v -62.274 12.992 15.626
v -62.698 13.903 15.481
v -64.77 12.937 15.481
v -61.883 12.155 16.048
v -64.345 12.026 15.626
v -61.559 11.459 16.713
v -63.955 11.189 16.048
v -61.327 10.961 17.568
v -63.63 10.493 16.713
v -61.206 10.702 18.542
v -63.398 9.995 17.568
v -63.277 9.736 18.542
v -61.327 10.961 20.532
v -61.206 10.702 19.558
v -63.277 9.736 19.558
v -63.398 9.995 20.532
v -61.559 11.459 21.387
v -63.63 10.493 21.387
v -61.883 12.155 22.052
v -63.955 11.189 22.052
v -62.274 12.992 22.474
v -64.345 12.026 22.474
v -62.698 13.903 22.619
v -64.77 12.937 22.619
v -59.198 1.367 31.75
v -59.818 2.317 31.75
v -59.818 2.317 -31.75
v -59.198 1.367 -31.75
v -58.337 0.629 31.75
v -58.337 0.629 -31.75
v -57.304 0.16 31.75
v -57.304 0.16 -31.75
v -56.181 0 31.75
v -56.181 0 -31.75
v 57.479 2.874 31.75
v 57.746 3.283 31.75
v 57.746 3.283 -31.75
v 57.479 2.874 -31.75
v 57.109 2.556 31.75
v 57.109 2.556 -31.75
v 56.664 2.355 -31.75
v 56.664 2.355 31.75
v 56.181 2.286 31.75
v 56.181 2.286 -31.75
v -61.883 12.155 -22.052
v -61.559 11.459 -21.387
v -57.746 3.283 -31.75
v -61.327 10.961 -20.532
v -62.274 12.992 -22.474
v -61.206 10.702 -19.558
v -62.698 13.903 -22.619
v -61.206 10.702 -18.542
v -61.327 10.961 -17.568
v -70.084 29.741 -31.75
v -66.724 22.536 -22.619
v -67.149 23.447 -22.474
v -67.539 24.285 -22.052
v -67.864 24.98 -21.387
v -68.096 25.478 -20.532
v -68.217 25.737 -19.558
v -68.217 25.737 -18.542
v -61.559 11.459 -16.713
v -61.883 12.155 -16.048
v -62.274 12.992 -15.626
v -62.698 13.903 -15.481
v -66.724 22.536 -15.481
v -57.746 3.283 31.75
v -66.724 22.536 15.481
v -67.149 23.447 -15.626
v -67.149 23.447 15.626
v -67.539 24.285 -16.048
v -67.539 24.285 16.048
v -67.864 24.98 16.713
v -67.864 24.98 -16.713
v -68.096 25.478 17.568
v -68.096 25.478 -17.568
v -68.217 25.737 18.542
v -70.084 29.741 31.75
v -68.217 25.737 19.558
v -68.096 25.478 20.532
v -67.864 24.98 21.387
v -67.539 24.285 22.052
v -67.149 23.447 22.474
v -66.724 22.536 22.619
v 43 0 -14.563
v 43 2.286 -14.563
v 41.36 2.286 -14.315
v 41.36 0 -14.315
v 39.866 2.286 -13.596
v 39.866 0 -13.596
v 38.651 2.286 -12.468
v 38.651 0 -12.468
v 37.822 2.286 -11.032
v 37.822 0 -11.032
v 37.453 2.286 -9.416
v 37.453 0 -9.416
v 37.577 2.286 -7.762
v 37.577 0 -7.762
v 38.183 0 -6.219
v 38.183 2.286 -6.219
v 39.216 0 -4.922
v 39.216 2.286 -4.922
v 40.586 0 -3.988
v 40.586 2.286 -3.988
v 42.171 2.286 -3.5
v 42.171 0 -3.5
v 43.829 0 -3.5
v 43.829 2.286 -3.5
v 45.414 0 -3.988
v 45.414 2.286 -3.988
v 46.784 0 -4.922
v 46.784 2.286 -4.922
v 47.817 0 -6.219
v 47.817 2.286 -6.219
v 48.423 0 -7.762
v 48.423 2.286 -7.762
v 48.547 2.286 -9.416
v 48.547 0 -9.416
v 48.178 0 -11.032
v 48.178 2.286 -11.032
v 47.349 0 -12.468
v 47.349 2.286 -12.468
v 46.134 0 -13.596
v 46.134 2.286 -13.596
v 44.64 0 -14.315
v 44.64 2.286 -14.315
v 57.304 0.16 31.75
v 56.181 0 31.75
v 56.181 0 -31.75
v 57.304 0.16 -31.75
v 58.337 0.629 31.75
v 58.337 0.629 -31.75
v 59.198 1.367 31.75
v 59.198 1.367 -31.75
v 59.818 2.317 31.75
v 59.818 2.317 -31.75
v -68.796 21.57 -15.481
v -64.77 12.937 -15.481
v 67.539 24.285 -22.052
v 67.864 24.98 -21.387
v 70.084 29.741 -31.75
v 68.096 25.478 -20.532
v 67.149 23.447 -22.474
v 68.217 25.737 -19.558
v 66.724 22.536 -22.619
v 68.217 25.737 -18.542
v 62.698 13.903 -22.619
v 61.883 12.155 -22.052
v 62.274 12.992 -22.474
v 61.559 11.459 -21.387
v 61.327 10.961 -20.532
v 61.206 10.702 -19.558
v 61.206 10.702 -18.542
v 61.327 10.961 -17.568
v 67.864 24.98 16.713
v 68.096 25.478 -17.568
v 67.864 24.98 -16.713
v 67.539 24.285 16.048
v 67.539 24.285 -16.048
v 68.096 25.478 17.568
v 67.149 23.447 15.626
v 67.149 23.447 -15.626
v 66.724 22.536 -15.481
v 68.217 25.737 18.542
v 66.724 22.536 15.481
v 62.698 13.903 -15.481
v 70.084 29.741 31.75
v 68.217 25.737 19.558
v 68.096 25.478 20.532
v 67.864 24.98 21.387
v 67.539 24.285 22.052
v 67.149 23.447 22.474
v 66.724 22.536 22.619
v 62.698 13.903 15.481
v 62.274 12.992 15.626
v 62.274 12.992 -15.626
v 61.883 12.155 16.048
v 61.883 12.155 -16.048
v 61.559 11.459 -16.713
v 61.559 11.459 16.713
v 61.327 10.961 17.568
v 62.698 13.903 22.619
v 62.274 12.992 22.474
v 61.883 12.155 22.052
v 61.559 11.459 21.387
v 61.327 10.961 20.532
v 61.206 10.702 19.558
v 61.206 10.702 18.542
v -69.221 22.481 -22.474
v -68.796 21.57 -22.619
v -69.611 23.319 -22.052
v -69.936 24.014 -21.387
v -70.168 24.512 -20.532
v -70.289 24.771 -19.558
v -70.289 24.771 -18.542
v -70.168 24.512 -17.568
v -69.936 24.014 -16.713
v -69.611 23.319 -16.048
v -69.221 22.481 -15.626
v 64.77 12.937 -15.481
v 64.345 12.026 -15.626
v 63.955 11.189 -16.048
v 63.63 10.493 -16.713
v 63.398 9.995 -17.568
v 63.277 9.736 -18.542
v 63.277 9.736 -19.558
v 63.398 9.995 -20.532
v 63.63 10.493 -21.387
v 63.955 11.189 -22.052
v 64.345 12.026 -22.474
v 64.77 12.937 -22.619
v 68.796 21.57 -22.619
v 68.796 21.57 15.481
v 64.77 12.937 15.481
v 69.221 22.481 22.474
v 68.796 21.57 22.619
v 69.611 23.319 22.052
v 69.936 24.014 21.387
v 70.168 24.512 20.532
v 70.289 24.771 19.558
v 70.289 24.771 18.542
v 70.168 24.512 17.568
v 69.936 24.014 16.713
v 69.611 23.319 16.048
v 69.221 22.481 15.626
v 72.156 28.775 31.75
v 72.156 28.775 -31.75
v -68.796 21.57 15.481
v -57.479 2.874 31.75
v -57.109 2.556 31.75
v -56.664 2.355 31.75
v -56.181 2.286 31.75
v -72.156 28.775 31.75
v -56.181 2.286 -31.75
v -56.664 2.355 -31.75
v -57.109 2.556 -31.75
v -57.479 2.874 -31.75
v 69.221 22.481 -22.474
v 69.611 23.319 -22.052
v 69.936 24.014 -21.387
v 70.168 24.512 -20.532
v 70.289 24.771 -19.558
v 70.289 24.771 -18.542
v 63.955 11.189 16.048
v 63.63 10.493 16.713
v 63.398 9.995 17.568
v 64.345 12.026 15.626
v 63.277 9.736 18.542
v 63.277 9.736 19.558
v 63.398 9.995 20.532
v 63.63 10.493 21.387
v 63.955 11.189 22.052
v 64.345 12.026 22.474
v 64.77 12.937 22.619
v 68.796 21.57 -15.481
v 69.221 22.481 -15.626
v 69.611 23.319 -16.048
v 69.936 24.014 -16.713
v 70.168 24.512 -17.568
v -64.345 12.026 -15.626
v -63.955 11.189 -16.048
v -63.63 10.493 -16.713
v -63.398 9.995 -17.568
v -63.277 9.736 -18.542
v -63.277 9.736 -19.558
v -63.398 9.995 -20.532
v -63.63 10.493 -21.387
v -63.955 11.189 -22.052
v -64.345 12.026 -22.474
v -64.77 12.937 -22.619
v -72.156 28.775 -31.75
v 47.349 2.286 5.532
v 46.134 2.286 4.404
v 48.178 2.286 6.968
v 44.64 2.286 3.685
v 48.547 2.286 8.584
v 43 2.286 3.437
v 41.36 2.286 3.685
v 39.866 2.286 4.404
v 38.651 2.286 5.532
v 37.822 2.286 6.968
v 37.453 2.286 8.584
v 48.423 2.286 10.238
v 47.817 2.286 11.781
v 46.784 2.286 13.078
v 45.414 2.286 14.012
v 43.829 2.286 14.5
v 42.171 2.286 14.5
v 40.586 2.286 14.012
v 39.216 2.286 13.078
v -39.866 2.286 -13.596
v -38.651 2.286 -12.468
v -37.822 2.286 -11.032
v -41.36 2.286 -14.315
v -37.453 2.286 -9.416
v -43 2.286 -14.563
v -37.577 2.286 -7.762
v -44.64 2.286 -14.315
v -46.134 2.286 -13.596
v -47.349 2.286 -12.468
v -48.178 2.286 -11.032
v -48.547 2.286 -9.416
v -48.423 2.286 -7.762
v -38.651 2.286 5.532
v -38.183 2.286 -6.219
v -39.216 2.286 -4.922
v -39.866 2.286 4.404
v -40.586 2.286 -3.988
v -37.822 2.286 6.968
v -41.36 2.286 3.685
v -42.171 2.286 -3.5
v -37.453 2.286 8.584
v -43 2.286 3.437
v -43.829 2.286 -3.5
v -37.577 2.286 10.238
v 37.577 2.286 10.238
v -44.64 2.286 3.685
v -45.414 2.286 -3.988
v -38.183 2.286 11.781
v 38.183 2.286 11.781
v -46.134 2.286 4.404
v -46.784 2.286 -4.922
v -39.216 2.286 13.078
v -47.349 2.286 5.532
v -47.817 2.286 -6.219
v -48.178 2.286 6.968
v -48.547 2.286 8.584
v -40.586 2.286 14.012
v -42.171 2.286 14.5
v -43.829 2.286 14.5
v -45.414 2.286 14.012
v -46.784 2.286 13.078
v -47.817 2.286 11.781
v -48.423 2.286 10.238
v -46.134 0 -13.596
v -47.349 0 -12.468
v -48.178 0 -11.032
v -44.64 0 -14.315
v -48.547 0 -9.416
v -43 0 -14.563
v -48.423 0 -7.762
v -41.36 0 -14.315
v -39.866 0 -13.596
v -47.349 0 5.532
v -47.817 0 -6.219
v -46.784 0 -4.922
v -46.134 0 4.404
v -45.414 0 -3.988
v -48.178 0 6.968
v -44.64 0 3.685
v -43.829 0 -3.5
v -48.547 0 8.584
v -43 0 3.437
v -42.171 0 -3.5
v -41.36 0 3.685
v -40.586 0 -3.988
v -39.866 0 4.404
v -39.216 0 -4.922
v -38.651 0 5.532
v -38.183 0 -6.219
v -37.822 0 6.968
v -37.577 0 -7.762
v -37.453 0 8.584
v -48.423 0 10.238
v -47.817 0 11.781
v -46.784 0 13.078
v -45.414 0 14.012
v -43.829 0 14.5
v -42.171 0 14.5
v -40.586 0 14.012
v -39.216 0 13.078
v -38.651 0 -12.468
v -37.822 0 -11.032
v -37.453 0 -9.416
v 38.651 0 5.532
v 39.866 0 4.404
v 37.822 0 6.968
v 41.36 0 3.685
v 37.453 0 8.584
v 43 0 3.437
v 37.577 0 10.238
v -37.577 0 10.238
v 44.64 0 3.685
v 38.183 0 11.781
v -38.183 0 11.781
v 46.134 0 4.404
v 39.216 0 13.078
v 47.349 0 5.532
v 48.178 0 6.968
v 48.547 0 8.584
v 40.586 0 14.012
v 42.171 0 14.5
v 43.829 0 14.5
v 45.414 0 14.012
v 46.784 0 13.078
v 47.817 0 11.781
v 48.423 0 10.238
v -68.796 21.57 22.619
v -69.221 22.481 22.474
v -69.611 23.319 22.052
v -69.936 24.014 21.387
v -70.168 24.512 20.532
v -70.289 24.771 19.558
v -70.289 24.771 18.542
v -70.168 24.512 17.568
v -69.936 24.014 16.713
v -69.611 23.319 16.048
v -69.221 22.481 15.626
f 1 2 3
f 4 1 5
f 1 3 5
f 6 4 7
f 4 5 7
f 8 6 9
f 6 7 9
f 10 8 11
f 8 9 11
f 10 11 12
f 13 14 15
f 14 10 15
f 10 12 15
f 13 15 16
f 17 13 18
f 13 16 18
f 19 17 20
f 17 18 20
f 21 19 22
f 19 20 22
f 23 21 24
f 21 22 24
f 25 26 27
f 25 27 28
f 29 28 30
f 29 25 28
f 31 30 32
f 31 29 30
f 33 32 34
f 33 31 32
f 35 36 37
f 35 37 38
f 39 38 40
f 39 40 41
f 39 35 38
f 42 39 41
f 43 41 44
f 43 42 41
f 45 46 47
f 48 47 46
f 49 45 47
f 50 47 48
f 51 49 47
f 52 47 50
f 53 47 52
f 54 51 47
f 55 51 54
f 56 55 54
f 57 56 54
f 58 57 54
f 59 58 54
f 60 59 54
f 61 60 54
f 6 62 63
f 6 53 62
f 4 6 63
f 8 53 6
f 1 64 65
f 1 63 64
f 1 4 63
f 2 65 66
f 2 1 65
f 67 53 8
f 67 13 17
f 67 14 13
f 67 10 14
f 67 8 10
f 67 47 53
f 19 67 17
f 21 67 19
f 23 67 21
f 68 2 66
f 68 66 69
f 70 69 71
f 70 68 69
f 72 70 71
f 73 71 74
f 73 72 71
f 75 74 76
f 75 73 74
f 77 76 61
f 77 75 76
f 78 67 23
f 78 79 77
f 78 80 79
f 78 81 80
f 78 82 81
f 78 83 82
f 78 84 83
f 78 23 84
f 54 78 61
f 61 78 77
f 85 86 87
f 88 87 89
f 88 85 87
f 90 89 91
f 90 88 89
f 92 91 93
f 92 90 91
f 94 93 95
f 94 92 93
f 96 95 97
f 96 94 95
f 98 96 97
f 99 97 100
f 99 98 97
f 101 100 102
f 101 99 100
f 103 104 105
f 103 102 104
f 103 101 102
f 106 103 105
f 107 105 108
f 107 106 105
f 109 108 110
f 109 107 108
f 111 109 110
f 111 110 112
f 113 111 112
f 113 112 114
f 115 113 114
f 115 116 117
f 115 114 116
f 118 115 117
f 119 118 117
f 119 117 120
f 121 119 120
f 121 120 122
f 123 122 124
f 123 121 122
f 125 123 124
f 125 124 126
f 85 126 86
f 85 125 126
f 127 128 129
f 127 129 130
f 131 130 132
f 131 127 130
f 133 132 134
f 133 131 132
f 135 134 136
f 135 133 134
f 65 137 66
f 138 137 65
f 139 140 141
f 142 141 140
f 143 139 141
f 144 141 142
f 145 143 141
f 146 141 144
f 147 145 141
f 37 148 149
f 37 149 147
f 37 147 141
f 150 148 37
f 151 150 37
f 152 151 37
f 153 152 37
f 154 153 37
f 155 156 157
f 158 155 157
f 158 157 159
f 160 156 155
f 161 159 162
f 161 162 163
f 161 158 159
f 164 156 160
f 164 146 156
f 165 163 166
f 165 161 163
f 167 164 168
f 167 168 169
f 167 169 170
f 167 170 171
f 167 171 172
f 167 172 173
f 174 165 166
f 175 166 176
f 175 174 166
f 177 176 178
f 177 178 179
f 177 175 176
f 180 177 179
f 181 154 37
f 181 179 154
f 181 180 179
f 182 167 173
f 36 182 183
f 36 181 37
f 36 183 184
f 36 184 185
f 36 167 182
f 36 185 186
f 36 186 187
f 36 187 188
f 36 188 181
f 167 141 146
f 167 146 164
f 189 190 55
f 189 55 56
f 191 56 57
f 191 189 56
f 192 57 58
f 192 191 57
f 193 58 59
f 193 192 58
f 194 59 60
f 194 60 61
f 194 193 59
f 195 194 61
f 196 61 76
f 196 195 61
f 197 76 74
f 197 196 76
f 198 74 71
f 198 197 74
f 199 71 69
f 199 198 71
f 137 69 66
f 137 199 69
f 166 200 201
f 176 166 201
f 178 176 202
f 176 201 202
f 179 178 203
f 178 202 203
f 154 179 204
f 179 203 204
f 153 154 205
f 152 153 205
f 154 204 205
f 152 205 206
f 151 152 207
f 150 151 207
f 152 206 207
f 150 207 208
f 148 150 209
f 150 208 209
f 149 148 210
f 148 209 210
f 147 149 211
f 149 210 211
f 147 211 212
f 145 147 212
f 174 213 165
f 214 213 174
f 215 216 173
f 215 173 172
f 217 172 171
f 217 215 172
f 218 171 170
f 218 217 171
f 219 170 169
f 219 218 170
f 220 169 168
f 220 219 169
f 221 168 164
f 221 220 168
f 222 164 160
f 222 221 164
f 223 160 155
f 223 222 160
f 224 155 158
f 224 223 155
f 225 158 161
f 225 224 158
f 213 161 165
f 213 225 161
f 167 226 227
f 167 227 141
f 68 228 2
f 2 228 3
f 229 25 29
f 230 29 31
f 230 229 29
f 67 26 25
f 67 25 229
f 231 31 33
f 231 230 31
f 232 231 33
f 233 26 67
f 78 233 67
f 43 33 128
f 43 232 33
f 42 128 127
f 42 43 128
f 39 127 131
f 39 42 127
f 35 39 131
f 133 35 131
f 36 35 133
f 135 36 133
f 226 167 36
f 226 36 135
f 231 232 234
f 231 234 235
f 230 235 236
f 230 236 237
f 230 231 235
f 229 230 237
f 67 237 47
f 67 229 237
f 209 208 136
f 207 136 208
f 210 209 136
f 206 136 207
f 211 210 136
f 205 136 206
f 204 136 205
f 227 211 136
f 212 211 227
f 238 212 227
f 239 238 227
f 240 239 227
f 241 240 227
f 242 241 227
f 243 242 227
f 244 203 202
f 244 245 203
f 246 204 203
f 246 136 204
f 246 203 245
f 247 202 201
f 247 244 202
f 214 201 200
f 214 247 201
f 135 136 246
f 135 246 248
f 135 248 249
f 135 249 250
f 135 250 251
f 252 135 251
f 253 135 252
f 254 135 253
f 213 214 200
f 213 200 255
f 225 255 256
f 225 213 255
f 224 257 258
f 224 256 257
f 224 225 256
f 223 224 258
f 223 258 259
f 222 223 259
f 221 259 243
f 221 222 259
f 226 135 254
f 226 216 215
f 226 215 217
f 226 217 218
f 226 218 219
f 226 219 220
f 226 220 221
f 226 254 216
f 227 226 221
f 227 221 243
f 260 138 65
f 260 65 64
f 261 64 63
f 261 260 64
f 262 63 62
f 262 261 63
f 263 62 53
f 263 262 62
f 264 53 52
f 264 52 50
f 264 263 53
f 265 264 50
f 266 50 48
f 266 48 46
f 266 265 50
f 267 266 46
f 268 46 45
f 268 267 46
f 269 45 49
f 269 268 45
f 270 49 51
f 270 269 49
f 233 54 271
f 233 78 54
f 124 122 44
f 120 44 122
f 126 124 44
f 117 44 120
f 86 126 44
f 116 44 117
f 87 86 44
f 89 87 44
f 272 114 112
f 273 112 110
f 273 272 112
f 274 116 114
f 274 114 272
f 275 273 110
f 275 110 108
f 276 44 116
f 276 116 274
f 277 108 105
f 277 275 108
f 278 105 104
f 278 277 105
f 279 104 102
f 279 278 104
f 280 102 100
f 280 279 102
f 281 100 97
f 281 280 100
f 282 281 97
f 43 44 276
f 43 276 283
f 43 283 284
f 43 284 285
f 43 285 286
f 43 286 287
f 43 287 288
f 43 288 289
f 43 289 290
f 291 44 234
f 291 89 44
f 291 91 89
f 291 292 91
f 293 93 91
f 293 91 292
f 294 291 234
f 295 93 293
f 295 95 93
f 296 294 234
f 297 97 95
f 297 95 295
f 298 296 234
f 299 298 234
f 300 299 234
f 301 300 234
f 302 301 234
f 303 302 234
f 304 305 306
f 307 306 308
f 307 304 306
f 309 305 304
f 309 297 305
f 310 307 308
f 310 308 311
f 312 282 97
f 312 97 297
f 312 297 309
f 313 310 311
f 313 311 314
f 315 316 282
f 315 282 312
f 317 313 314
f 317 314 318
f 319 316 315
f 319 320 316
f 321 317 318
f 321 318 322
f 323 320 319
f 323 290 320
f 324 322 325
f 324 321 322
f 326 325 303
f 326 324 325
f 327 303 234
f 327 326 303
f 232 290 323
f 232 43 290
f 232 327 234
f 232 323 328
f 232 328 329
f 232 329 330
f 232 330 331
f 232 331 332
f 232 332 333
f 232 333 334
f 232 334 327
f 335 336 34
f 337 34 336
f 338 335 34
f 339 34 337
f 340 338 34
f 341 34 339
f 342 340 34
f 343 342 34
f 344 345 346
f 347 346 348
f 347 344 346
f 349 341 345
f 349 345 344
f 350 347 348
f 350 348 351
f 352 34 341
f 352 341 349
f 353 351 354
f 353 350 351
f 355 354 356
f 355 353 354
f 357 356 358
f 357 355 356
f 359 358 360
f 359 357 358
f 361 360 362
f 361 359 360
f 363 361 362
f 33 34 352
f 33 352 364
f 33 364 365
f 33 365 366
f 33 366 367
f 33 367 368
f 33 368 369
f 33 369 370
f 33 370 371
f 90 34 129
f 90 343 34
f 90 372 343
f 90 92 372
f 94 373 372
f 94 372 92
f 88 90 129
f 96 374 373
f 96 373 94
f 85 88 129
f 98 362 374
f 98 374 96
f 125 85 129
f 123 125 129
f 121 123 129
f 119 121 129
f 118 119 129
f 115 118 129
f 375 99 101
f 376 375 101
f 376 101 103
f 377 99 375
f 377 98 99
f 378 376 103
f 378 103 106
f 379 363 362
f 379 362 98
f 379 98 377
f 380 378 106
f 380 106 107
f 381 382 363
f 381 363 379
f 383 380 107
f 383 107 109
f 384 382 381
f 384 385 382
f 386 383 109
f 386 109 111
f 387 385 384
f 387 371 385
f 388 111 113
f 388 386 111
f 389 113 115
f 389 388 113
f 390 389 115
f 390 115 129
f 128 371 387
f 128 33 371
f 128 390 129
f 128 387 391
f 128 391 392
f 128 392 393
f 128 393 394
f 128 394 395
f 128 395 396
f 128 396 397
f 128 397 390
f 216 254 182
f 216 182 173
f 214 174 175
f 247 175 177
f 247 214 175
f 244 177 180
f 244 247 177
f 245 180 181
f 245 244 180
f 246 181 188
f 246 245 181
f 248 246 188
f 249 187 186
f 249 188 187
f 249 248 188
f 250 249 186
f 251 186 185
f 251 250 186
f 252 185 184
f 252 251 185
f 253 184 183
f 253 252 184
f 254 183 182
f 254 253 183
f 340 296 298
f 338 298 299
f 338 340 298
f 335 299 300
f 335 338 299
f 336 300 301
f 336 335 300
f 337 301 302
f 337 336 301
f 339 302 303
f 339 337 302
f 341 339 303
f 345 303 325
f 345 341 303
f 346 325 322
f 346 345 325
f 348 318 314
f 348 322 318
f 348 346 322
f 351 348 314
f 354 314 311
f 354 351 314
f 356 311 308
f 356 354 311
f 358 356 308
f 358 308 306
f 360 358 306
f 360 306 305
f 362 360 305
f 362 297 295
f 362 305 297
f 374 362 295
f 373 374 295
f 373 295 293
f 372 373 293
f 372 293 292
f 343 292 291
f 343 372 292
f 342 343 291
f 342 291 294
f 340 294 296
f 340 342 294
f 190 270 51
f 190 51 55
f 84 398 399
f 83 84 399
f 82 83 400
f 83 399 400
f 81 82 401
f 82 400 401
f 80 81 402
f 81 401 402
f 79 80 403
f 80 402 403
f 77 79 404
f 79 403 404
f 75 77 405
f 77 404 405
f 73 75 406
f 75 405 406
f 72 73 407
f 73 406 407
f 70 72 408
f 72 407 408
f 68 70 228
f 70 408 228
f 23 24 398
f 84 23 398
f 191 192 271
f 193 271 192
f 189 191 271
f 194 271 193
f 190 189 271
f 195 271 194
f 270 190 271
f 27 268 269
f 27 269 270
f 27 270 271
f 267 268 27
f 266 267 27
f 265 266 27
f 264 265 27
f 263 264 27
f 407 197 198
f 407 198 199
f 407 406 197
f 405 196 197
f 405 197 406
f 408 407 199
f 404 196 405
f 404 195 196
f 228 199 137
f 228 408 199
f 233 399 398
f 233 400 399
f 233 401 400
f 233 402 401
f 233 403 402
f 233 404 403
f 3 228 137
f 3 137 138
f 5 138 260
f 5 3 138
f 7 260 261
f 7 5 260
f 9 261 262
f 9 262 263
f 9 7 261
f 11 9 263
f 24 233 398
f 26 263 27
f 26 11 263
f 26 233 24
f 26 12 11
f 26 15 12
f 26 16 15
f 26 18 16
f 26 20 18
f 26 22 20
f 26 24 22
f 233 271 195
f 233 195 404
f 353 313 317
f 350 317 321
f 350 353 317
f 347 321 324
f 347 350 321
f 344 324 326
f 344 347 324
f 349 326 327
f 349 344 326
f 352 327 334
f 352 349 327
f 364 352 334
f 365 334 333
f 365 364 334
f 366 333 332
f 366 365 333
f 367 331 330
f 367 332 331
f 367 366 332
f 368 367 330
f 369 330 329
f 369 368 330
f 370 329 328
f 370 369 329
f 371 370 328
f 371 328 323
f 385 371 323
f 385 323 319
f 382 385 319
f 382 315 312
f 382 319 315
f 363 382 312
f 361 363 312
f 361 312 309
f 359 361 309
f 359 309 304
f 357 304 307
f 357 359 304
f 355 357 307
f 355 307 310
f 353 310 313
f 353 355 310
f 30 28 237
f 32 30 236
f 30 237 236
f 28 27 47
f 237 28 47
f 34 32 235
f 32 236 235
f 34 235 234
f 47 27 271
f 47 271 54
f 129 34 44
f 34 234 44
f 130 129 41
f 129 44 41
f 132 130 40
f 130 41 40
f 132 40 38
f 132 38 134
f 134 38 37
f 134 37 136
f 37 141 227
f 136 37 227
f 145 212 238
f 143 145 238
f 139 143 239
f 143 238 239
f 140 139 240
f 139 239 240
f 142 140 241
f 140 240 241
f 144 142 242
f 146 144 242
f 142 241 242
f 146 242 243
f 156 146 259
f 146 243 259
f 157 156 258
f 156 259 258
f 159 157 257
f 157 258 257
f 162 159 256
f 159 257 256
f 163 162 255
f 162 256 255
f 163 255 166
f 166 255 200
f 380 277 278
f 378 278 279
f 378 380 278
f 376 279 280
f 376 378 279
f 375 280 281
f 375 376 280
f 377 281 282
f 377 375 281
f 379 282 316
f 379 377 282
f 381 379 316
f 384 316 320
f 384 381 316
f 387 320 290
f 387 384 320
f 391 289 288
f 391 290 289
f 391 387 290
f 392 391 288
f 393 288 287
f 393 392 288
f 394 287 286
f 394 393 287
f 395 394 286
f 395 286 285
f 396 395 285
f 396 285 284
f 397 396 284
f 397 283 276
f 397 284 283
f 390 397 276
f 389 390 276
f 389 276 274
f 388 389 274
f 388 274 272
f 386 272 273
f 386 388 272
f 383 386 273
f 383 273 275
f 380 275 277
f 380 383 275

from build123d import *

# Parameters (mm, degrees)
BASE_FLANGE1_DEPTH = 31.75
CUT_EXTRUDE1_REACH = 86.256
SKETCH3_R          = 5.5626
CUT_EXTRUDE2_REACH = 137.032


# Sheet-metal steps are written as plain solids
with BuildPart() as part:
    # Sketch1 → Base-Flange1 (new, symmetric)
    with BuildSketch(Plane.XY):
        with BuildLine():
            Line((-72.15562981, 28.775272238), (-59.81800404, 2.317148392))
            ThreePointArc((-59.81800404, 2.317148392), (-58.337100418, 0.62850145), (-56.180809629, 0))
            Line((-56.180809629, 0), (56.180809629, 0))
            ThreePointArc((56.180809629, 0), (58.337100418, 0.62850145), (59.81800404, 2.317148392))
            Line((59.81800404, 2.317148392), (72.15562981, 28.775272238))
            Line((72.15562981, 28.775272238), (70.083810209, 29.741377585))
            Line((70.083810209, 29.741377585), (57.746184439, 3.283253738))
            ThreePointArc((57.746184439, 3.283253738), (57.108833513, 2.556494295), (56.180809629, 2.286))
            Line((56.180809629, 2.286), (-56.180809629, 2.286))
            ThreePointArc((-56.180809629, 2.286), (-57.108833513, 2.556494295), (-57.746184439, 3.283253738))
            Line((-57.746184439, 3.283253738), (-70.083810209, 29.741377585))
            Line((-70.083810209, 29.741377585), (-72.15562981, 28.775272238))
        make_face()
    extrude(amount=BASE_FLANGE1_DEPTH, both=True)

    # Sketch3 → Cut-Extrude1 (cut, up to next)
    with BuildSketch(Plane(origin=(0, 0, 0), x_dir=(1, 0, 0), z_dir=(0, 1, 0)), mode=Mode.PRIVATE) as cut_extrude1_sk1:
        with Locations(Location((43, 9, 0), (0, 0, 90))):
            Circle(SKETCH3_R)
    cut_extrude1_tool1 = extrude(cut_extrude1_sk1.sketch, amount=CUT_EXTRUDE1_REACH, mode=Mode.PRIVATE) & part.part
    # Sketch3 → Cut-Extrude1 (cut, up to next)
    with BuildSketch(Plane(origin=(0, 0, 0), x_dir=(1, 0, 0), z_dir=(0, 1, 0)), mode=Mode.PRIVATE) as cut_extrude1_sk2:
        with Locations(Location((43, -9, 0), (0, 0, 90))):
            Circle(SKETCH3_R)
    cut_extrude1_tool2 = extrude(cut_extrude1_sk2.sketch, amount=CUT_EXTRUDE1_REACH, mode=Mode.PRIVATE) & part.part
    # Sketch3 → Cut-Extrude1 (cut, up to next)
    with BuildSketch(Plane(origin=(0, 0, 0), x_dir=(1, 0, 0), z_dir=(0, 1, 0)), mode=Mode.PRIVATE) as cut_extrude1_sk3:
        with Locations(Location((-43, -9, 0), (0, 0, 90))):
            Circle(SKETCH3_R)
    cut_extrude1_tool3 = extrude(cut_extrude1_sk3.sketch, amount=CUT_EXTRUDE1_REACH, mode=Mode.PRIVATE) & part.part
    # Sketch3 → Cut-Extrude1 (cut, up to next)
    with BuildSketch(Plane(origin=(0, 0, 0), x_dir=(1, 0, 0), z_dir=(0, 1, 0)), mode=Mode.PRIVATE) as cut_extrude1_sk4:
        with Locations(Location((-43, 9, 0), (0, 0, 90))):
            Circle(SKETCH3_R)
    cut_extrude1_tool4 = extrude(cut_extrude1_sk4.sketch, amount=CUT_EXTRUDE1_REACH, mode=Mode.PRIVATE) & part.part
    add(cut_extrude1_tool1.solids().sort_by_distance((43, 0, -9))[0], mode=Mode.SUBTRACT)
    add(cut_extrude1_tool2.solids().sort_by_distance((43, 0, 9))[0], mode=Mode.SUBTRACT)
    add(cut_extrude1_tool3.solids().sort_by_distance((-43, 0, 9))[0], mode=Mode.SUBTRACT)
    add(cut_extrude1_tool4.solids().sort_by_distance((-43, 0, -9))[0], mode=Mode.SUBTRACT)

    # Sketch4 → Cut-Extrude2 (cut, up to next)
    with BuildSketch(Plane(origin=(48.246618612, -22.497767739, 0), x_dir=(0, 0, -1), z_dir=(0.9063077870366514, -0.4226182617406968, 0)), mode=Mode.PRIVATE) as cut_extrude2_sk1:
        with BuildLine():
            Line((22.6187, 39.098340149), (22.6187, 48.623340149))
            ThreePointArc((22.6187, 48.623340149), (19.05, 52.192040149), (15.4813, 48.623340149))
            Line((15.4813, 48.623340149), (15.4813, 39.098340149))
            ThreePointArc((15.4813, 39.098340149), (19.05, 35.529640149), (22.6187, 39.098340149))
        make_face()
    cut_extrude2_tool1 = extrude(cut_extrude2_sk1.sketch, amount=-CUT_EXTRUDE2_REACH, mode=Mode.PRIVATE) & part.part
    # Sketch4 → Cut-Extrude2 (cut, up to next)
    with BuildSketch(Plane(origin=(48.246618612, -22.497767739, 0), x_dir=(0, 0, -1), z_dir=(0.9063077870366514, -0.4226182617406968, 0)), mode=Mode.PRIVATE) as cut_extrude2_sk2:
        with BuildLine():
            Line((-15.4813, 48.623340149), (-15.4813, 39.098340149))
            ThreePointArc((-15.4813, 39.098340149), (-19.05, 35.529640149), (-22.6187, 39.098340149))
            Line((-22.6187, 39.098340149), (-22.6187, 48.623340149))
            ThreePointArc((-22.6187, 48.623340149), (-19.05, 52.192040149), (-15.4813, 48.623340149))
        make_face()
    cut_extrude2_tool2 = extrude(cut_extrude2_sk2.sketch, amount=-CUT_EXTRUDE2_REACH, mode=Mode.PRIVATE) & part.part
    cut_extrude2_1 = cut_extrude2_tool1.solids().sort_by_distance((66.783011, 17.253653, -19.05))[0]
    add(cut_extrude2_1, mode=Mode.SUBTRACT)
    cut_extrude2_2 = cut_extrude2_tool2.solids().sort_by_distance((66.783011, 17.253653, 19.05))[0]
    add(cut_extrude2_2, mode=Mode.SUBTRACT)
    cut_extrude2 = cut_extrude2_1 + cut_extrude2_2  # Cut-Extrude2 as one shape, for the pattern or mirror that repeats it

    # Mirror1: Cut-Extrude2 across plane
    add(cut_extrude2.mirror(Plane(origin=(0, 0, 0), x_dir=(0, 0, 1), z_dir=(1, 0, 0))), mode=Mode.SUBTRACT)


solid = part.part
